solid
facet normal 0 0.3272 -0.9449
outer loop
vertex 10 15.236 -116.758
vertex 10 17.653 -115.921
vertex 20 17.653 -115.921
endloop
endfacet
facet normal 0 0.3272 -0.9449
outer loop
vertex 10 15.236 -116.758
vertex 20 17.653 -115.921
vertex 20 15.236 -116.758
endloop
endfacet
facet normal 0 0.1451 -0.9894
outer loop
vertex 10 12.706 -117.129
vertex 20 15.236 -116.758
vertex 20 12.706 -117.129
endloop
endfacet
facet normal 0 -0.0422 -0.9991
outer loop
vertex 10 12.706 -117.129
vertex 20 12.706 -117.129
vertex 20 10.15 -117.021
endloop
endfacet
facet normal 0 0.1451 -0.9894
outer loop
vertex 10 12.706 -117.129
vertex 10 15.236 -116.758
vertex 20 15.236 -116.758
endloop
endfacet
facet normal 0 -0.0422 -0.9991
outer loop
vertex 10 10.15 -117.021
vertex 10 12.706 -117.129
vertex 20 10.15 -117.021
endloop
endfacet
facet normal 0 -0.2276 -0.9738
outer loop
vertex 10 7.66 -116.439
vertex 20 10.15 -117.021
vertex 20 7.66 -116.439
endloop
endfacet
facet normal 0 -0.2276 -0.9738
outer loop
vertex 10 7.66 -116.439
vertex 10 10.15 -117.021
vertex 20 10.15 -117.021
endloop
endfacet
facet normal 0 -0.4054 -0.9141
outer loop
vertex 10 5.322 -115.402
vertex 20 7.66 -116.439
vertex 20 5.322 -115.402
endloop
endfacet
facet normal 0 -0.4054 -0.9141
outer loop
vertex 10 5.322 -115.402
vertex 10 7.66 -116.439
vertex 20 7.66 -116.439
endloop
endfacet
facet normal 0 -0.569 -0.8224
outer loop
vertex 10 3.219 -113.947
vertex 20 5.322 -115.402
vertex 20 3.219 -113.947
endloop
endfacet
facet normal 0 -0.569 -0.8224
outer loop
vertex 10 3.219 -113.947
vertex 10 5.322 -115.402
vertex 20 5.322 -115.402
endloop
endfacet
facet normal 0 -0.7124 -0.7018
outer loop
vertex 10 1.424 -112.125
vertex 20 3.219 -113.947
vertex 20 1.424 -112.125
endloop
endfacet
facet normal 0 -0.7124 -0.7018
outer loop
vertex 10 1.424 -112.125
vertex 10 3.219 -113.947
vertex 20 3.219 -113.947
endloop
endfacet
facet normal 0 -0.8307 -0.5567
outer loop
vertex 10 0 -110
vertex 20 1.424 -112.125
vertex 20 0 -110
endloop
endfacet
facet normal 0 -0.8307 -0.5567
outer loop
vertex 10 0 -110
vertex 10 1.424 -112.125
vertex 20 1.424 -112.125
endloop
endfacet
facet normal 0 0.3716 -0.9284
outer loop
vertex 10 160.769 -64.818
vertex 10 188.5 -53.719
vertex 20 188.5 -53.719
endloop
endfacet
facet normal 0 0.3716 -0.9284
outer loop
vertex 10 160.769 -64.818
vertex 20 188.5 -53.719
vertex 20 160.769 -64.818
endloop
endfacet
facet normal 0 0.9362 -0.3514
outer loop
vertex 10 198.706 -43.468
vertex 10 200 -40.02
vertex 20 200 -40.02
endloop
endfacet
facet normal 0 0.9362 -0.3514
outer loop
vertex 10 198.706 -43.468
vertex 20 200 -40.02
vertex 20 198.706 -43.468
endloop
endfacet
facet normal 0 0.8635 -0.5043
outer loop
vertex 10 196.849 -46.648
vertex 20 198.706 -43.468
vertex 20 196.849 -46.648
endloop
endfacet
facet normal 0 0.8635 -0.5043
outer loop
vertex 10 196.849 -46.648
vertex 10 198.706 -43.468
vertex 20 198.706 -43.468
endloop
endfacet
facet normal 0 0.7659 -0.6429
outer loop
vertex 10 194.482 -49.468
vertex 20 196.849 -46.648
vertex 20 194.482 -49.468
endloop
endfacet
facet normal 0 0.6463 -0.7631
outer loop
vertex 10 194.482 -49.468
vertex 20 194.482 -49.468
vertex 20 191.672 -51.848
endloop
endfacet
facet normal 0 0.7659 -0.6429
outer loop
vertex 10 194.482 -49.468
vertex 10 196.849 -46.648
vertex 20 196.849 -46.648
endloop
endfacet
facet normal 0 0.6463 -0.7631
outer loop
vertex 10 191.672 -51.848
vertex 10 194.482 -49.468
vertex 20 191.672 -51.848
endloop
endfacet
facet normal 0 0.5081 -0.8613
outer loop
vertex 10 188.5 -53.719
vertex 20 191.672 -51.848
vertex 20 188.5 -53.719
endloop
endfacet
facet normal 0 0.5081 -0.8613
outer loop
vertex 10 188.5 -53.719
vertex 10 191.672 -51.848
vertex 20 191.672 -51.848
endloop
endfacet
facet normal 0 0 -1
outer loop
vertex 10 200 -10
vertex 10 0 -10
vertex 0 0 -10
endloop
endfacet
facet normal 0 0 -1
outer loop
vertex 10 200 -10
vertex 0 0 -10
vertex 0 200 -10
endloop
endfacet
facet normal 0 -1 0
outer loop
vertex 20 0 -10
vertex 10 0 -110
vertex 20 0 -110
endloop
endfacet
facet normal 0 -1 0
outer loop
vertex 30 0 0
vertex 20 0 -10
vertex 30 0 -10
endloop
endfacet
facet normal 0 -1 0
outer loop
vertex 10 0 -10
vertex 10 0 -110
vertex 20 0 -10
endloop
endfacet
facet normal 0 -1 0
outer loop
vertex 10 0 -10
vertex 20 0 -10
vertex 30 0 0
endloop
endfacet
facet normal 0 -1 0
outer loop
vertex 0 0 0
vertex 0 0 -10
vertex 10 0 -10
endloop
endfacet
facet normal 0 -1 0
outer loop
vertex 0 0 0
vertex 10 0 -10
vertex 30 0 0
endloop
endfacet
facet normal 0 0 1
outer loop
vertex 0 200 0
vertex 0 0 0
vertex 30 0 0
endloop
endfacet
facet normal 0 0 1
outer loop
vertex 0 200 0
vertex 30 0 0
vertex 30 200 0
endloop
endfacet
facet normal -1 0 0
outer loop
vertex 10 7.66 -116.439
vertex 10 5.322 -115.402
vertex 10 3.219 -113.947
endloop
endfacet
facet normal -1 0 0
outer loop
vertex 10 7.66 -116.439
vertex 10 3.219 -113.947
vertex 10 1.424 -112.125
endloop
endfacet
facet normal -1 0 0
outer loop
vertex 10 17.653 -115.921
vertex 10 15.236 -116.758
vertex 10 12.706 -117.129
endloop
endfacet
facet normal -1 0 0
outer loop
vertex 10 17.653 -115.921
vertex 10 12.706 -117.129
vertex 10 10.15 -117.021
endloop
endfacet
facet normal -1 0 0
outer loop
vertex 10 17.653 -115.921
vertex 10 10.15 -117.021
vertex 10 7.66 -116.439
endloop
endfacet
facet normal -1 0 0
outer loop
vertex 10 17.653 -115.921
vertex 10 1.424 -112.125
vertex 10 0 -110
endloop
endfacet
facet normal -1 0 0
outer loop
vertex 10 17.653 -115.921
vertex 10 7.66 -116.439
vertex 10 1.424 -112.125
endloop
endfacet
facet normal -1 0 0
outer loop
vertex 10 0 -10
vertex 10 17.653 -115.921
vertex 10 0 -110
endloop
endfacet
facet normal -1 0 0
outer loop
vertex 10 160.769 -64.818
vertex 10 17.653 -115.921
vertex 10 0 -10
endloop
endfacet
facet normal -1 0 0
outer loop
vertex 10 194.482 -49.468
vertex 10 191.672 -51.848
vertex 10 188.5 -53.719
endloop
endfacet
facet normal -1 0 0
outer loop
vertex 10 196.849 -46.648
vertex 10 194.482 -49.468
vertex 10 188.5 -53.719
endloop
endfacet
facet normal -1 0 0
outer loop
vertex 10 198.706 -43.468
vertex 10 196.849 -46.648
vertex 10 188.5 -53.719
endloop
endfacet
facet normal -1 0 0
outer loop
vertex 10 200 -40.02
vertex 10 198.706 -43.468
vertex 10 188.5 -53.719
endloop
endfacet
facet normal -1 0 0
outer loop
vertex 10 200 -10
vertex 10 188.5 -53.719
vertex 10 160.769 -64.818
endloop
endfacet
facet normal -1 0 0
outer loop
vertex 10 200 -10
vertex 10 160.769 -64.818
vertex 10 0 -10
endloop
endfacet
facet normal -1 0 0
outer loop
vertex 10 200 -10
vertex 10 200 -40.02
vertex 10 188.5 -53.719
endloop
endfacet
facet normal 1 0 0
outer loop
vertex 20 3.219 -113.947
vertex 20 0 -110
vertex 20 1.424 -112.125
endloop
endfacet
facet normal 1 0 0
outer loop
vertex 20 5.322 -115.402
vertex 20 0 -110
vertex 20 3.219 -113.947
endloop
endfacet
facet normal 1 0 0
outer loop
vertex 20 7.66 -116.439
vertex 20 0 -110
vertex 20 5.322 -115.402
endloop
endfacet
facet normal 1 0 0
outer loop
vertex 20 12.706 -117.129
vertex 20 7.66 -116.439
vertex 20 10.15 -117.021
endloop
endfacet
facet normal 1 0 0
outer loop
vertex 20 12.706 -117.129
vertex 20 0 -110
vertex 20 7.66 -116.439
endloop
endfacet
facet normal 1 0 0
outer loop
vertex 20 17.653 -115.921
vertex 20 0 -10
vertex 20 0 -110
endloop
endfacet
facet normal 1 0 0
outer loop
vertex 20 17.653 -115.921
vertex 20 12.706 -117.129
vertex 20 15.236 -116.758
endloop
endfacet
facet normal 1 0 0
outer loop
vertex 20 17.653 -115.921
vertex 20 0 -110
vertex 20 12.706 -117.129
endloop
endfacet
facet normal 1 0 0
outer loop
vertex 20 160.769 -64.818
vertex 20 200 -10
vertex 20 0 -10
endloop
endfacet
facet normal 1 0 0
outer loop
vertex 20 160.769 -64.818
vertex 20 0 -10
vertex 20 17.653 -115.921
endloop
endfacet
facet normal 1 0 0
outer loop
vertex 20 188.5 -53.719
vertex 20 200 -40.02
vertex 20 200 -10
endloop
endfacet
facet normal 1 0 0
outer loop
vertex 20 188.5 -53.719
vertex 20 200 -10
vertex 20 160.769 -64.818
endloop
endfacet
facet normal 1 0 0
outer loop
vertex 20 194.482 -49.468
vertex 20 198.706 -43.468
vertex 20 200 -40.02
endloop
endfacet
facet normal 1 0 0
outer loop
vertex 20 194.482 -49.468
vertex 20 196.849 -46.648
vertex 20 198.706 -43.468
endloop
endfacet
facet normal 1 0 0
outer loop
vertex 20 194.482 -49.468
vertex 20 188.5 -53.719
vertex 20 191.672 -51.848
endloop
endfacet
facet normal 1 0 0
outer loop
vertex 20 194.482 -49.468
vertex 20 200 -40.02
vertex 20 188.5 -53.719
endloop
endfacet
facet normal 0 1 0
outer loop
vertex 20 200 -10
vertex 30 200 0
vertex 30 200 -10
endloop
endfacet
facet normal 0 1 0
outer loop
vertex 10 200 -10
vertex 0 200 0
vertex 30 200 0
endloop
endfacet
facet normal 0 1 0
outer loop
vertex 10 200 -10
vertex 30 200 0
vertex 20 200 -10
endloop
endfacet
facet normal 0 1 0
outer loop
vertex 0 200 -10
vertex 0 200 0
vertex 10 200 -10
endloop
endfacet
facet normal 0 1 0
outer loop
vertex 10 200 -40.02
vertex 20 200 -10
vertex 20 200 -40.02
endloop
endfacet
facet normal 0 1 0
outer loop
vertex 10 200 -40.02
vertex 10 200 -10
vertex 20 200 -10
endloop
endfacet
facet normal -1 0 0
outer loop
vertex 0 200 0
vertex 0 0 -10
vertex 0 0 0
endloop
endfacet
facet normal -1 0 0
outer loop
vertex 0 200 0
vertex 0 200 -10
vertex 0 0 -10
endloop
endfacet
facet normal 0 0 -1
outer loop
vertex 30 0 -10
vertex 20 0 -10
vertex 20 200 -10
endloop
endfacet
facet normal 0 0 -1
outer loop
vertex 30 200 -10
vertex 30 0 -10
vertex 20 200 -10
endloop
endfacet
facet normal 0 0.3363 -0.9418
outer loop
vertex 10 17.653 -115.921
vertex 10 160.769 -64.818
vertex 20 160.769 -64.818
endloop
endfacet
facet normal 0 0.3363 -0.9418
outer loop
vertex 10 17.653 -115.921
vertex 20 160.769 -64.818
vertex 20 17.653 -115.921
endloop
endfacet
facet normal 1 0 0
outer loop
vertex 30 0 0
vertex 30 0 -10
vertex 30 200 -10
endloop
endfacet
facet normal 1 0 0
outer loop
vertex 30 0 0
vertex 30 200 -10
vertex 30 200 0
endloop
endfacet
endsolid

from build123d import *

# Parameters (mm, degrees)
RESSALTO_EXTRUS_O1_DEPTH = 30
ESBO_O7_W                = 124.831233659
ESBO_O7_H                = 205.409079033
CORTE_EXTRUS_O1_DEPTH    = 26
ESBO_O9_W                = 108.1037386
ESBO_O9_H                = 206.486977543
CORTE_EXTRUS_O2_DEPTH    = 72


with BuildPart() as part:
    # Esboço1 → Ressalto-extrusão1 (new body)
    with BuildSketch(Plane(origin=(0, 0, 0), x_dir=(0, 0, -1), z_dir=(1, 0, 0))):
        with BuildLine():
            Line((0, 0), (0, 200))
            Line((0, 200), (40.020408359, 200))
            ThreePointArc((40.020408359, 200), (48.108078735, 195.725277713), (53.718695877, 188.5))
            Line((53.718695877, 188.5), (64.817635807, 160.769350553))
            Line((64.817635807, 160.769350553), (115.921293578, 17.653015861))
            ThreePointArc((115.921293578, 17.653015861), (116.438632656, 7.659898466), (110, 0))
            Line((110, 0), (0, 0))
        make_face()
    extrude(amount=RESSALTO_EXTRUS_O1_DEPTH)

    # Esboço7 → Corte-extrusão1 (cut)
    with BuildSketch(Plane(origin=(20, 0, 0), x_dir=(0, 0, -1), z_dir=(1, 0, 0))):
        with Locations((72.41561683, 101.939412441)):
            Rectangle(ESBO_O7_W, ESBO_O7_H)
    extrude(amount=CORTE_EXTRUS_O1_DEPTH, mode=Mode.SUBTRACT)

    # Esboço9 → Corte-extrusão2 (cut)
    with BuildSketch(Plane.ZY.offset(-10)):
        with Locations((-64.0518693, 99.930966914)):
            Rectangle(ESBO_O9_W, ESBO_O9_H)
    extrude(amount=CORTE_EXTRUS_O2_DEPTH, mode=Mode.SUBTRACT)


solid = part.part
